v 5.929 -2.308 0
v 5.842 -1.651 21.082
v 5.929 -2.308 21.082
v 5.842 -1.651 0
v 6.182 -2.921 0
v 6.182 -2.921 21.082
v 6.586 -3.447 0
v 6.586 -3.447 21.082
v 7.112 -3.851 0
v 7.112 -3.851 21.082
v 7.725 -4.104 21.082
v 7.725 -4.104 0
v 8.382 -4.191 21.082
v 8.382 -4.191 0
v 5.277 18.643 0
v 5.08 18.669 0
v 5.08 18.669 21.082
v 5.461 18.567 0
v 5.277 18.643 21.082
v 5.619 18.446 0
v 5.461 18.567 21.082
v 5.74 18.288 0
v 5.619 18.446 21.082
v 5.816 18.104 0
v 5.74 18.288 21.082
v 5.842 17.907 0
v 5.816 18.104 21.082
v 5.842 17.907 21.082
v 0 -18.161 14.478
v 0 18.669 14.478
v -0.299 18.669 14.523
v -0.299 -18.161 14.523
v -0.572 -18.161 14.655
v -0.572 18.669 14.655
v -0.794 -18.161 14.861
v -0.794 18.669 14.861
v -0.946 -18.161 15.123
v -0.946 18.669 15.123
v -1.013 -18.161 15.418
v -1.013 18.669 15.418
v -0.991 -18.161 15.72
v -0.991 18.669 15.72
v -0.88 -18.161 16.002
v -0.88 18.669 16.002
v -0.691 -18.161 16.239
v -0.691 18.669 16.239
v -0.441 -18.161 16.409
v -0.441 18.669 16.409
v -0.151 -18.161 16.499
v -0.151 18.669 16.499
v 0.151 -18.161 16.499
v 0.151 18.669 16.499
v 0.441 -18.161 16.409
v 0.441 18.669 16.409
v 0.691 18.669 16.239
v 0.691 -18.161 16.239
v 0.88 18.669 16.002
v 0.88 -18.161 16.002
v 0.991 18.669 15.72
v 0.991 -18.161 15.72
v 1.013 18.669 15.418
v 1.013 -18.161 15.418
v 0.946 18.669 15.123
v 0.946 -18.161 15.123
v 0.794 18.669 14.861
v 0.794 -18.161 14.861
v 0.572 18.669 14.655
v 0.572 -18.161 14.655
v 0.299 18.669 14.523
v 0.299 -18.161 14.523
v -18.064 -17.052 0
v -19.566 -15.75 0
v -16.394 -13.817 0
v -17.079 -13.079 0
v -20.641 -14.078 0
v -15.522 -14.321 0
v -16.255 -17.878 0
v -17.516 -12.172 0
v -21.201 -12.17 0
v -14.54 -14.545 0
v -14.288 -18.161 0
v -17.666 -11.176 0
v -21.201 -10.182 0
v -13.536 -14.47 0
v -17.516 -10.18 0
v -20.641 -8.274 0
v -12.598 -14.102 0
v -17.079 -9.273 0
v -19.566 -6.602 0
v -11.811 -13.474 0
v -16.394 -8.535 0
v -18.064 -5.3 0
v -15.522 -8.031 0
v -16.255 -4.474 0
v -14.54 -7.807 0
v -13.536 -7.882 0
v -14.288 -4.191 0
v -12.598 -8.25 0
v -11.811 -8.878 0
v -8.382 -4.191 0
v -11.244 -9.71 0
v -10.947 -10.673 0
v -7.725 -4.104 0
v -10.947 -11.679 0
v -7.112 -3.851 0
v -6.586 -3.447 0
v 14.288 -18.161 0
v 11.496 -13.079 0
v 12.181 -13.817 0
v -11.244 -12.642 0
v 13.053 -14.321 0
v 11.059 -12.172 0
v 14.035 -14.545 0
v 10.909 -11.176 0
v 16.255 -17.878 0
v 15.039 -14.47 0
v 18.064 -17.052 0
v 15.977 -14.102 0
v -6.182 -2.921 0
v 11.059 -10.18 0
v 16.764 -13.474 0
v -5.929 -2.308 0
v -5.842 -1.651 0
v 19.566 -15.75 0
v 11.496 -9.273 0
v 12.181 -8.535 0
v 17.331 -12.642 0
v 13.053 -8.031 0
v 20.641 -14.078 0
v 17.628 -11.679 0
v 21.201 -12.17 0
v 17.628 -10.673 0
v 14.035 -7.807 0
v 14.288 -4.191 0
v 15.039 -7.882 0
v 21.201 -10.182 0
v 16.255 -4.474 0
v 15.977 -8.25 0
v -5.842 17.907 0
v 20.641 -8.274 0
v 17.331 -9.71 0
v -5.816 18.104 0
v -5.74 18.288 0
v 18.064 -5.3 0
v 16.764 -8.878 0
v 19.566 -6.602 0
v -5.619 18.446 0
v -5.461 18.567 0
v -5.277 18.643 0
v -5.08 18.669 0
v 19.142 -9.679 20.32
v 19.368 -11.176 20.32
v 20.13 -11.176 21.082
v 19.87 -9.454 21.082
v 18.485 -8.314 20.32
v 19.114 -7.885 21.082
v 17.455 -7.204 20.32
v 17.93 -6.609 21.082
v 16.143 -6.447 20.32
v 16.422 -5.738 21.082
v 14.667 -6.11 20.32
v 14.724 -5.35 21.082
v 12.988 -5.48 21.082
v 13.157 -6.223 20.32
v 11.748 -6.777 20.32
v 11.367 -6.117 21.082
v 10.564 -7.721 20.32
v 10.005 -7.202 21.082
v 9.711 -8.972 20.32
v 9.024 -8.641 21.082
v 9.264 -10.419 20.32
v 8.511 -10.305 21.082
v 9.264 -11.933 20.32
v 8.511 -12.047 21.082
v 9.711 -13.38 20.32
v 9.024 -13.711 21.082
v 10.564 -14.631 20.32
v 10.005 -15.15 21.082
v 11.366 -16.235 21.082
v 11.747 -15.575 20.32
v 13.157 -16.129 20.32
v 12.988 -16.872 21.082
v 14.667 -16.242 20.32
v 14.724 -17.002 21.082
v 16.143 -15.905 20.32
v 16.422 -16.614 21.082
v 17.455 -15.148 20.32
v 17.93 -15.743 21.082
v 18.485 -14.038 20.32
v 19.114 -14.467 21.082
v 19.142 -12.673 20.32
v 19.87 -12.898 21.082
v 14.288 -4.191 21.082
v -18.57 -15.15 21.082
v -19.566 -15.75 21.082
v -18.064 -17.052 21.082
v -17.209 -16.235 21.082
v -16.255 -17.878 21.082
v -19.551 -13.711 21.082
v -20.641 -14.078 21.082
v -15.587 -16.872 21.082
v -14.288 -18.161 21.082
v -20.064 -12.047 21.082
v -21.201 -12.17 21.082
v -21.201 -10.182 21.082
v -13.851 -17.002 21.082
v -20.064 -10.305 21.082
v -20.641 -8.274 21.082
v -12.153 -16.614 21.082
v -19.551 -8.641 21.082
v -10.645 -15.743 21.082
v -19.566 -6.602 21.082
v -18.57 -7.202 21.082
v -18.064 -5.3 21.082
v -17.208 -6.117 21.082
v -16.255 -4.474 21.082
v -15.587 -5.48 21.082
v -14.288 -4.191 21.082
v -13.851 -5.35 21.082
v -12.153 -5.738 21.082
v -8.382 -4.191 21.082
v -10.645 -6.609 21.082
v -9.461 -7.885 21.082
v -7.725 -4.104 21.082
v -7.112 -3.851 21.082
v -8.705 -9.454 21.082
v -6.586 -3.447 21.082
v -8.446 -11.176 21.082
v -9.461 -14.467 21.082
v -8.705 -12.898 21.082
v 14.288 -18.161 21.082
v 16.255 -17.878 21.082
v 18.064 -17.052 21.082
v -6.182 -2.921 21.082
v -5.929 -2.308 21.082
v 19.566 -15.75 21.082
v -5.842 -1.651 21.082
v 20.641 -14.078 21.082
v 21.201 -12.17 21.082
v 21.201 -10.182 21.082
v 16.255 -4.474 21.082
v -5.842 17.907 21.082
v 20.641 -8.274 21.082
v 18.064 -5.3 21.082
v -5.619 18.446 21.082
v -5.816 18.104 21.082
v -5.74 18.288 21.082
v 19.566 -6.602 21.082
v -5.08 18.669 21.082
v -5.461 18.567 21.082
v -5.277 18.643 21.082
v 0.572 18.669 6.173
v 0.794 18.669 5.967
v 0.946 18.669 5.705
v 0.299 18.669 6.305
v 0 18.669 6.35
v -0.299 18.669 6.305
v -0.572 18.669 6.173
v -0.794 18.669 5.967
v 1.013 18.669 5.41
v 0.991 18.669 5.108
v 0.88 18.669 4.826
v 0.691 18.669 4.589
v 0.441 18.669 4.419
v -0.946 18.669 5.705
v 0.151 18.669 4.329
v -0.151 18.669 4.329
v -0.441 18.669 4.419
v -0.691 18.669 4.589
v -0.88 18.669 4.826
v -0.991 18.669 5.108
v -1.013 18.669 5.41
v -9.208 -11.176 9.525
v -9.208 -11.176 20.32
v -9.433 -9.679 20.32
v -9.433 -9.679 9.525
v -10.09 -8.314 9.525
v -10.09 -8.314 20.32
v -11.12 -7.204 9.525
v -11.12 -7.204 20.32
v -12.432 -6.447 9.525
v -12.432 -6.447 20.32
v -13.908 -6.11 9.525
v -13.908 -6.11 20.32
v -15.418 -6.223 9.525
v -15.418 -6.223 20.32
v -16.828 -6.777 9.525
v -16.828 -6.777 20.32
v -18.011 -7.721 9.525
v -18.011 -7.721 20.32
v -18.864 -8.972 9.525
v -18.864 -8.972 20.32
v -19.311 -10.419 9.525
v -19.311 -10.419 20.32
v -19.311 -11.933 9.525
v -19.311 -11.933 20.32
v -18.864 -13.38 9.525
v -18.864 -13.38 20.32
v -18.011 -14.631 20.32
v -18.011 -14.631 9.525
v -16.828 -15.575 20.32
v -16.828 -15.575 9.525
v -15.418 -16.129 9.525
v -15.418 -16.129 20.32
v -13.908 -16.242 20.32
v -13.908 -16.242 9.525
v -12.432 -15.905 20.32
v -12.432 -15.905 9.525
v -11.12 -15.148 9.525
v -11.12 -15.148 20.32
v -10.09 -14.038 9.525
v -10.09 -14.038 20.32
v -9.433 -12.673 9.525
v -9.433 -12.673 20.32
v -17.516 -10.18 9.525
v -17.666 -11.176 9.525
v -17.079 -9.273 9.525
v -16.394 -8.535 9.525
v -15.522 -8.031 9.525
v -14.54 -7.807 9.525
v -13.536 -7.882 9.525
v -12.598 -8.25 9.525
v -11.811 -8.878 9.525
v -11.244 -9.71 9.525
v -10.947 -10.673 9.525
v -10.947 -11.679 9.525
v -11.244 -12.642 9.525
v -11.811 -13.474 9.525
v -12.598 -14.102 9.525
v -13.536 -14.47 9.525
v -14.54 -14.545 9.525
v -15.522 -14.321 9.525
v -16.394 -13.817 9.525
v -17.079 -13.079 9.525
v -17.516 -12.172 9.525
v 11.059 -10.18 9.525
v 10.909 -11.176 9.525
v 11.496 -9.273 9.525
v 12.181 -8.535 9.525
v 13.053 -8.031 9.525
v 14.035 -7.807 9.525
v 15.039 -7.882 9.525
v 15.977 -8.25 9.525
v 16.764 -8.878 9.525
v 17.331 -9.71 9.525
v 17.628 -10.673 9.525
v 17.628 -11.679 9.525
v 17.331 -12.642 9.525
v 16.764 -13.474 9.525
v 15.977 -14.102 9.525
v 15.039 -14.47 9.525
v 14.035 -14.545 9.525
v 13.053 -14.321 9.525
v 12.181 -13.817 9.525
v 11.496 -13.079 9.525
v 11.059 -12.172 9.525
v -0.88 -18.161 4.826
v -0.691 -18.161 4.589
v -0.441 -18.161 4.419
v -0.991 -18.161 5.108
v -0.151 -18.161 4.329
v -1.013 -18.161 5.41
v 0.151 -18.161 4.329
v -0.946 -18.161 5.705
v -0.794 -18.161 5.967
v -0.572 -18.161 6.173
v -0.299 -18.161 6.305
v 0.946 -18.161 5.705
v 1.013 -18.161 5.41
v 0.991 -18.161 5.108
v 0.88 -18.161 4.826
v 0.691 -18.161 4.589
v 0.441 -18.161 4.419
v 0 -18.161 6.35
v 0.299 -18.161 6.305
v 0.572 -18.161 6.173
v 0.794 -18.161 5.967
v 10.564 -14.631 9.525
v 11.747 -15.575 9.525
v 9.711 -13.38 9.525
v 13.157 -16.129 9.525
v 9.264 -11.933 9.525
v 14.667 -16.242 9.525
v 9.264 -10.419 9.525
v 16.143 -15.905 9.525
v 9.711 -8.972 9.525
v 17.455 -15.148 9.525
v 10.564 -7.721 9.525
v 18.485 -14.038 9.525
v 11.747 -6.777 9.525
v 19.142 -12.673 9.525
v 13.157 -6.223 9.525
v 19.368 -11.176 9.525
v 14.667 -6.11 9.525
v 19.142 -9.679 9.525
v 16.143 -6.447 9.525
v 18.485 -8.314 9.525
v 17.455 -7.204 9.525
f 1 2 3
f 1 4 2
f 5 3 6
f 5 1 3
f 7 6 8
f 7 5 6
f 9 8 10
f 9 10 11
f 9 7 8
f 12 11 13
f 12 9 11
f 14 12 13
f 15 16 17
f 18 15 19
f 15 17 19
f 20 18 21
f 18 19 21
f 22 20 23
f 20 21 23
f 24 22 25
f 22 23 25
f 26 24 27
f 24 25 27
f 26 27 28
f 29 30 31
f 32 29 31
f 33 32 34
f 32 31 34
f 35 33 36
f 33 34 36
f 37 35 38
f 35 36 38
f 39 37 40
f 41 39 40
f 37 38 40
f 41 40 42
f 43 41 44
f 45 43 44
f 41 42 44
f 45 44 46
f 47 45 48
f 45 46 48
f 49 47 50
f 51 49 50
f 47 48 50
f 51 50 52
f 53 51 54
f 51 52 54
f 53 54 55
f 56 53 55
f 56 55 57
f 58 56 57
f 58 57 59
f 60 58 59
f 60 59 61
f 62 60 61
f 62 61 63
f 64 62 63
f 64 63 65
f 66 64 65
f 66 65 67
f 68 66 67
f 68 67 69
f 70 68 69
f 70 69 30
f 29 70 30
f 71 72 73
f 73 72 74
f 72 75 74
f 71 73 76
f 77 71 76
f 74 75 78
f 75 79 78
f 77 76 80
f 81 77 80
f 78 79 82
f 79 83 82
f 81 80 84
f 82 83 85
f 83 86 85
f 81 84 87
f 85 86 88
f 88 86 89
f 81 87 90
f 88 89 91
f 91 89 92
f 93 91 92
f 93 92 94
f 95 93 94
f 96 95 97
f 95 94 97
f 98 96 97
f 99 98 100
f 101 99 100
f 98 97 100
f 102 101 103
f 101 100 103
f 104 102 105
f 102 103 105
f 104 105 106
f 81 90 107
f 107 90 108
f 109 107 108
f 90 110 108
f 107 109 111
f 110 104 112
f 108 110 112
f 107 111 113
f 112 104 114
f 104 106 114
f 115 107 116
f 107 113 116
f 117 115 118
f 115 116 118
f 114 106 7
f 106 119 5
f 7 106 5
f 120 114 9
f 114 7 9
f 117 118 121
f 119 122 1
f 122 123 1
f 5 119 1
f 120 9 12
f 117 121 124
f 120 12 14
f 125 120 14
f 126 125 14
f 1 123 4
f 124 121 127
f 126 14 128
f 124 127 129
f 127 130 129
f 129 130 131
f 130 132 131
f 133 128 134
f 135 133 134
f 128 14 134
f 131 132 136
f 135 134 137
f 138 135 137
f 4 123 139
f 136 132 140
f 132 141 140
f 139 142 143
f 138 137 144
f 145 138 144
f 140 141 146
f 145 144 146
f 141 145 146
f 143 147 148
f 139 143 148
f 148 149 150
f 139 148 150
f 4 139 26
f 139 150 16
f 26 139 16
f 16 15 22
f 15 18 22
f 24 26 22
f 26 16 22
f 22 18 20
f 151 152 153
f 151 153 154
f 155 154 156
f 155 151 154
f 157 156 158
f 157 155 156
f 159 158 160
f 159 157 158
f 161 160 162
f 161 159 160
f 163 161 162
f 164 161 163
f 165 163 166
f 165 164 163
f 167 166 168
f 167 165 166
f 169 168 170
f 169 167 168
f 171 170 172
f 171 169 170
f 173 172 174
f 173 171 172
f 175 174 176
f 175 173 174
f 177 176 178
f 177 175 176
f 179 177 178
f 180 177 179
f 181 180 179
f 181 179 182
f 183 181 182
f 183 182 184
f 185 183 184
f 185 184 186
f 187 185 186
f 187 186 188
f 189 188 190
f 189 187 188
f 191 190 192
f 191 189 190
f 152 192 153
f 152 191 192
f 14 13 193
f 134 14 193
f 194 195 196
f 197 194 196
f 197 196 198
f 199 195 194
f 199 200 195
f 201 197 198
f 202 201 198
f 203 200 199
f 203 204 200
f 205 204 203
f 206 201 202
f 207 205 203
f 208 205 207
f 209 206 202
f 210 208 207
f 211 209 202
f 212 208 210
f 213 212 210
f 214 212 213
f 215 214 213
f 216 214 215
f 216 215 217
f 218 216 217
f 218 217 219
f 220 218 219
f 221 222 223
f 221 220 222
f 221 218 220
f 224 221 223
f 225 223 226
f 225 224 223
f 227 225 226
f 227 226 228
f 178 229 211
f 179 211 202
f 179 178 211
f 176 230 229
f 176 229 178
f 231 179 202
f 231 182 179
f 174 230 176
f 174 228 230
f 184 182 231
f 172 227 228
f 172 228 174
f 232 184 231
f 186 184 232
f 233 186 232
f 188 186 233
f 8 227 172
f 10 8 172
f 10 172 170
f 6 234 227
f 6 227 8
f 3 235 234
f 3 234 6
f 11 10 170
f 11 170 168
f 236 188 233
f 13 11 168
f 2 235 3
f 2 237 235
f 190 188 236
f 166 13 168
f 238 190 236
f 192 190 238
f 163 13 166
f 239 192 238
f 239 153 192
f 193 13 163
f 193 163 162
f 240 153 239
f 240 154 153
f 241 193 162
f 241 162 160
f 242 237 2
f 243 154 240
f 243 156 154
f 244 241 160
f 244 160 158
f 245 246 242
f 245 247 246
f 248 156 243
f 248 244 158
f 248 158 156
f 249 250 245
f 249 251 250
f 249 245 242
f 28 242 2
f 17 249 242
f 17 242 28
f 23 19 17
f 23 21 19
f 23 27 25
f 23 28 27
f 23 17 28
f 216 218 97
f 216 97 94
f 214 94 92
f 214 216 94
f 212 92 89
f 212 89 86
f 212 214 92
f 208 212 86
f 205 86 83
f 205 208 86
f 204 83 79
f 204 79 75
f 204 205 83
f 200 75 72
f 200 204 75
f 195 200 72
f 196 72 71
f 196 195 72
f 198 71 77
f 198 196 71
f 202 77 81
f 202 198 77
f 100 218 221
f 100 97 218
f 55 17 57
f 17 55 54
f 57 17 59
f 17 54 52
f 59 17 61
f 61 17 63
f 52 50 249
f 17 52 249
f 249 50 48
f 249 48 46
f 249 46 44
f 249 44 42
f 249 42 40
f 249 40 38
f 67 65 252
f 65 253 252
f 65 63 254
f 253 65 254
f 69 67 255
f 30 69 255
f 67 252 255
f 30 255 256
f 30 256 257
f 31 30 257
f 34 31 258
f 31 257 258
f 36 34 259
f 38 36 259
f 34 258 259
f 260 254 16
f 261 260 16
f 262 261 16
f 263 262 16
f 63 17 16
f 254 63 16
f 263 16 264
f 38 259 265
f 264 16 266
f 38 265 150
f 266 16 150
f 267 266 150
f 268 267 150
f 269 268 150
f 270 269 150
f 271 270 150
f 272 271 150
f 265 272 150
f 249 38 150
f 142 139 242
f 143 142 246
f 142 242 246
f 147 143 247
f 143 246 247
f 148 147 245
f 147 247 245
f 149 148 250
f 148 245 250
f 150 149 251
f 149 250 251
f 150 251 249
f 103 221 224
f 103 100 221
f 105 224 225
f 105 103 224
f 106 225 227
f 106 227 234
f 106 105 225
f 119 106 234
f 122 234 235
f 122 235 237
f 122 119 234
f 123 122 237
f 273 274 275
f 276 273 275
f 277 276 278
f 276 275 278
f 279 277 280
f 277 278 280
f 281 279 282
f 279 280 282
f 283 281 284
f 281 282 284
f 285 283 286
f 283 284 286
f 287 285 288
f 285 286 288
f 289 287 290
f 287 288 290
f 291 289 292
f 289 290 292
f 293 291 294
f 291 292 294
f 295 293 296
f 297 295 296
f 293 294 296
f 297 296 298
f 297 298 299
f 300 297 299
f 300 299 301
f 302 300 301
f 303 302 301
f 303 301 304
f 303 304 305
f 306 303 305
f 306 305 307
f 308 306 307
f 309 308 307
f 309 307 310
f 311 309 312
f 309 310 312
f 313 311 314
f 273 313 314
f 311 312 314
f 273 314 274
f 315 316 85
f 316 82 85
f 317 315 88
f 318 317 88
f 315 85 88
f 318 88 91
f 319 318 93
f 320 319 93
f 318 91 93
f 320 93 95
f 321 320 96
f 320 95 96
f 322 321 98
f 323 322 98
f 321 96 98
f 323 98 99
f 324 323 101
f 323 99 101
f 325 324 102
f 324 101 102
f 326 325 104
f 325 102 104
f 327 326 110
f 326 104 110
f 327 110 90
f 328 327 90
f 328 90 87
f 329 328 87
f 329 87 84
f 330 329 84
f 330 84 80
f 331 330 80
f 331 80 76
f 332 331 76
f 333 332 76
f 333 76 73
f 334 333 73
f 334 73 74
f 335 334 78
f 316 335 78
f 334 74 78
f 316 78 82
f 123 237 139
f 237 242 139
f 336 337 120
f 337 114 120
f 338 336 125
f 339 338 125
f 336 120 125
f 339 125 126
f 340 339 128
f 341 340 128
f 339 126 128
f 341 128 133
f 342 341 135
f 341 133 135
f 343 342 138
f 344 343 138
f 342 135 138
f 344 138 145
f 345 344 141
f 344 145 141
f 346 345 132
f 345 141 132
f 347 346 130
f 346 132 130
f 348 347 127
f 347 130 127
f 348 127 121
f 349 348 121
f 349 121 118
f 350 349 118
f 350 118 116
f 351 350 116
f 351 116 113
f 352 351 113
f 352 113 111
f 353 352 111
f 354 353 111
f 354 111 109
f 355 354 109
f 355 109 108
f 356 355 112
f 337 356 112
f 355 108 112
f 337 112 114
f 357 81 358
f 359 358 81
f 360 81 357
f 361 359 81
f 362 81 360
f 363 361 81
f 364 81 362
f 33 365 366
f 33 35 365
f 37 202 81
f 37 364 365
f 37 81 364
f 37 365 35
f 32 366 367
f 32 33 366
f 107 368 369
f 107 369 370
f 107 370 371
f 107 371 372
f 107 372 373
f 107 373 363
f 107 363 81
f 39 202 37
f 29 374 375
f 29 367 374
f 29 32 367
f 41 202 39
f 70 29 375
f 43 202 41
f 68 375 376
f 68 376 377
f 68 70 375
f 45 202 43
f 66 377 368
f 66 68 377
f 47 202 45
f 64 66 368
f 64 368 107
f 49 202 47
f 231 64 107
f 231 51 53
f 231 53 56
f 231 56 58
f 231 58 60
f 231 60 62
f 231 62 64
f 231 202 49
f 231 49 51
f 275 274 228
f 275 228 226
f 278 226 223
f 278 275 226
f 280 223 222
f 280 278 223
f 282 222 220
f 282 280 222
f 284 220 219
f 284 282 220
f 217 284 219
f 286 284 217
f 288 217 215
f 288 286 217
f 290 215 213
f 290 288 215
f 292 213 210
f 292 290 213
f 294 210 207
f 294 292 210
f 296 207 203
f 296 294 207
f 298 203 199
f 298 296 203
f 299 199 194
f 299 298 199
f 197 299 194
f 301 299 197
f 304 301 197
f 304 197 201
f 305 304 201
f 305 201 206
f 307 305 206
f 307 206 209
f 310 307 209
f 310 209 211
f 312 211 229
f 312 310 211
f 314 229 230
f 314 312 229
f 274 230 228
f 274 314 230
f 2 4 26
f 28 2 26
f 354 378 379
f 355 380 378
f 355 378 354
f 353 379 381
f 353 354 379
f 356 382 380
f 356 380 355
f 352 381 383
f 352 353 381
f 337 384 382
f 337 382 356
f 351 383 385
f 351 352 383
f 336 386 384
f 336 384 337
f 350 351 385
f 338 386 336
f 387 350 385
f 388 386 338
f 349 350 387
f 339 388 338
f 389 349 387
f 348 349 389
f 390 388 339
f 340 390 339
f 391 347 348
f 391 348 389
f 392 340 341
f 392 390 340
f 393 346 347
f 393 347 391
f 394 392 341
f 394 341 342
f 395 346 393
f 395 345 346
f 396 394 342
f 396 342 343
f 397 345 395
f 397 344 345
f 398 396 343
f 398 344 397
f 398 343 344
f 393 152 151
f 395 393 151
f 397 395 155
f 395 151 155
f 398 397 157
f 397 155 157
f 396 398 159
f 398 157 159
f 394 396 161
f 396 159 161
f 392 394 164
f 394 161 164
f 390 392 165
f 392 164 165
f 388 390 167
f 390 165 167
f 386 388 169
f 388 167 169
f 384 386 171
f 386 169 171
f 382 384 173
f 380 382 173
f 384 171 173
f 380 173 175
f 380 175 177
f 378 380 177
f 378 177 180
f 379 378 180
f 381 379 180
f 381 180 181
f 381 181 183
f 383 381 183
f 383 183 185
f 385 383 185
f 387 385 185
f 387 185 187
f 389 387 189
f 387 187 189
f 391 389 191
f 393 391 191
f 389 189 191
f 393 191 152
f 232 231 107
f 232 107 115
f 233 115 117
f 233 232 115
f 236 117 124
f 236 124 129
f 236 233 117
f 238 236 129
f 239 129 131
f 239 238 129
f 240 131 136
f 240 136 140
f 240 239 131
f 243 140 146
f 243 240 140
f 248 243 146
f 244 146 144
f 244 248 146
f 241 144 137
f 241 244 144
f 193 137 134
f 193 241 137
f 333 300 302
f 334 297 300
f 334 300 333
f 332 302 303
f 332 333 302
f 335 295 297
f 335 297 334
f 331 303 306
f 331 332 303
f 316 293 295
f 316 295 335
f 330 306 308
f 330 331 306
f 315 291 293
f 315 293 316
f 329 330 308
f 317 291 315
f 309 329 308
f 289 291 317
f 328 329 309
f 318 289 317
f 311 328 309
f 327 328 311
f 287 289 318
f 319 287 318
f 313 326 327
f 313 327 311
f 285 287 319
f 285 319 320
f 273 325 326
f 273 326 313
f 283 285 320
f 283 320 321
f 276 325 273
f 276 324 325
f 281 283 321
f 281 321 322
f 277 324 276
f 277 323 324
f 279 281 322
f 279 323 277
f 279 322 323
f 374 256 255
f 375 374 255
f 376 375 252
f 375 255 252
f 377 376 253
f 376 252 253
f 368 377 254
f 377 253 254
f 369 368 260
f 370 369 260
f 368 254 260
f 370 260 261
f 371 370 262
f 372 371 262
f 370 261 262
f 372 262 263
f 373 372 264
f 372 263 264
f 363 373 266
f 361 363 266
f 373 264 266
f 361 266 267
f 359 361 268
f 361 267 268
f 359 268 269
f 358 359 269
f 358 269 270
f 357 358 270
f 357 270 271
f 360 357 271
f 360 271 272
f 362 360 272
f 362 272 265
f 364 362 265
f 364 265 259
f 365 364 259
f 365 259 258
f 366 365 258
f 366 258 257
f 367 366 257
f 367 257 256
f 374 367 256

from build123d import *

# Parameters (mm, degrees)
SKETCH1_R                                        = 1.27
BOSS_EXTRUDE1_DEPTH                              = 25.4
CSK_FOR_1_4_FLAT_HEAD_MACHINE_SCREW1_D           = 6.7564
CSK_FOR_1_4_FLAT_HEAD_MACHINE_SCREW1_CSINK_D     = 13.3194044
CSK_FOR_1_4_FLAT_HEAD_MACHINE_SCREW1_CSINK_ANGLE = 82
SKETCH4_R                                        = 1.016
CUT_EXTRUDE1_DEPTH                               = 40.37
SKETCH5_W                                        = 65.738203623
SKETCH5_H                                        = 8.173238607
CUT_EXTRUDE2_DEPTH                               = 40.37
FILLET1_R                                        = 0.762
SKETCH8_W                                        = 13.691843982
SKETCH8_H                                        = 25.635792988
SKETCH8_W_2                                      = 17.381844488
SKETCH8_H_2                                      = 26.703951029
CUT_EXTRUDE3_DEPTH                               = 22.082
SKETCH9_R                                        = 5.08
CUT_EXTRUDE4_DEPTH                               = 11.557
CHAMFER1_SIZE                                    = 0.762
SKETCH10_W                                       = 31.402844339
SKETCH10_H                                       = 33.249058222
SKETCH10_W_2                                     = 26.204679654
SKETCH10_H_2                                     = 29.468553059
CUT_EXTRUDE5_DEPTH                               = 2.54
SKETCH11_W                                       = 51.569967854
SKETCH11_H                                       = 49.340439169
CUT_EXTRUDE6_DEPTH                               = 22.082
FILLET3_R                                        = 2.54


with BuildPart() as part:
    # Sketch1 → Boss-Extrude1 (new body)
    with BuildSketch(Plane.XY):
        Polygon((-5.842, 18.669), (-5.842, -1.651), (-28.575, -1.651), (-28.575, -20.701), (28.575, -20.701), (28.575, -1.651), (5.842, -1.651), (5.842, 18.669), align=None)
        with Locations((14.2875, -11.176)):
            Circle(SKETCH1_R, mode=Mode.SUBTRACT)
        with Locations((-14.2875, -11.176)):
            Circle(SKETCH1_R, mode=Mode.SUBTRACT)
    extrude(amount=BOSS_EXTRUDE1_DEPTH)

    # CSK for 1/4 Flat Head Machine Screw1 (through all)
    with Locations(Plane.XY.offset(25.4)):
        with Locations((-14.2875, -11.176), (14.2875, -11.176)):
            CounterSinkHole(CSK_FOR_1_4_FLAT_HEAD_MACHINE_SCREW1_D / 2, CSK_FOR_1_4_FLAT_HEAD_MACHINE_SCREW1_CSINK_D / 2, counter_sink_angle=CSK_FOR_1_4_FLAT_HEAD_MACHINE_SCREW1_CSINK_ANGLE)

    # Sketch4 → Cut-Extrude1 (cut, through all)
    with BuildSketch(Plane(origin=(0, 18.669, 0), x_dir=(1, 0, 0), z_dir=(0, 1, 0))):
        with Locations(Location((0, -5.334, 0), (0, 0, 270))):  # turned: the seam where the file's is
            Circle(SKETCH4_R)
        with Locations(Location((0, -15.494, 0), (0, 0, 90))):  # turned: the seam where the file's is
            Circle(SKETCH4_R)
    extrude(amount=-CUT_EXTRUDE1_DEPTH, mode=Mode.SUBTRACT)

    # Sketch5 → Cut-Extrude2 (cut, through all)
    with BuildSketch(Plane(origin=(0, 18.669, 0), x_dir=(1, 0, 0), z_dir=(0, 1, 0))):
        with Locations((0.634161588, -25.168619304)):
            Rectangle(SKETCH5_W, SKETCH5_H)
    extrude(amount=-CUT_EXTRUDE2_DEPTH, mode=Mode.SUBTRACT)

    # Fillet1
    fillet1_edges = [part.edges().sort_by_distance(p)[0] for p in [
        (-5.842, 18.669, 10.541),
        (5.842, 18.669, 10.541),
    ]]
    fillet(fillet1_edges, radius=FILLET1_R)

    # Sketch8 → Cut-Extrude3 (cut, through all)
    with BuildSketch(Plane.XY.offset(21.082)):
        with Locations((30.340921991, -12.055237245)):
            Rectangle(SKETCH8_W, SKETCH8_H)
        with Locations((-32.185922244, -9.773263248)):
            Rectangle(SKETCH8_W_2, SKETCH8_H_2)
    extrude(amount=-CUT_EXTRUDE3_DEPTH, mode=Mode.SUBTRACT)

    # Sketch9 → Cut-Extrude4 (cut)
    with BuildSketch(Plane.XY.offset(21.082)):
        with Locations((14.2875, -11.176)):
            Circle(SKETCH9_R)
        with Locations((-14.2875, -11.176)):
            Circle(SKETCH9_R)
    extrude(amount=-CUT_EXTRUDE4_DEPTH, mode=Mode.SUBTRACT)

    # Chamfer1
    chamfer1_edges = [part.edges().sort_by_distance(p)[0] for p in [
        (9.2075, -11.176, 21.082),
        (-19.3675, -11.176, 21.082),
        (0, -20.701, 4.318),
        (0, -20.701, 16.51),
    ]]
    chamfer(chamfer1_edges, length=CHAMFER1_SIZE)

    # Sketch10 → Cut-Extrude5 (cut)
    with BuildSketch(Plane(origin=(0, -1.651, 0), x_dir=(1, 0, 0), z_dir=(0, 1, 0))):
        with Locations((-21.54342217, -13.037102767)):
            Rectangle(SKETCH10_W, SKETCH10_H)
        with Locations((18.944339827, -12.019274454)):
            Rectangle(SKETCH10_W_2, SKETCH10_H_2)
    extrude(amount=-CUT_EXTRUDE5_DEPTH, mode=Mode.SUBTRACT)

    # Sketch11 → Cut-Extrude6 (cut, through all)
    with BuildSketch(Plane.XY.offset(21.082)):
        with Locations((0.48369004, -1.756987777)):
            Rectangle(SKETCH11_W, SKETCH11_H)
        with BuildLine():
            Line((14.2875, -4.191), (5.842, -4.191))
            Line((5.842, -4.191), (5.842, 17.907))
            ThreePointArc((5.842, 17.907), (5.618815367, 18.445815367), (5.08, 18.669))
            Line((5.08, 18.669), (-5.08, 18.669))
            ThreePointArc((-5.08, 18.669), (-5.618815367, 18.445815367), (-5.842, 17.907))
            Line((-5.842, 17.907), (-5.842, -4.191))
            Line((-5.842, -4.191), (-14.2875, -4.191))
            ThreePointArc((-14.2875, -4.191), (-21.2725, -11.176), (-14.2875, -18.161))
            Line((-14.2875, -18.161), (14.2875, -18.161))
            ThreePointArc((14.2875, -18.161), (21.2725, -11.176), (14.2875, -4.191))
        make_face(mode=Mode.SUBTRACT)
    extrude(amount=-CUT_EXTRUDE6_DEPTH, mode=Mode.SUBTRACT)

    # Fillet3
    fillet3_edges = [part.edges().sort_by_distance(p)[0] for p in [
        (-5.842, -4.191, 10.541),
        (5.842, -4.191, 10.541),
    ]]
    fillet(fillet3_edges, radius=FILLET3_R)


solid = part.part
